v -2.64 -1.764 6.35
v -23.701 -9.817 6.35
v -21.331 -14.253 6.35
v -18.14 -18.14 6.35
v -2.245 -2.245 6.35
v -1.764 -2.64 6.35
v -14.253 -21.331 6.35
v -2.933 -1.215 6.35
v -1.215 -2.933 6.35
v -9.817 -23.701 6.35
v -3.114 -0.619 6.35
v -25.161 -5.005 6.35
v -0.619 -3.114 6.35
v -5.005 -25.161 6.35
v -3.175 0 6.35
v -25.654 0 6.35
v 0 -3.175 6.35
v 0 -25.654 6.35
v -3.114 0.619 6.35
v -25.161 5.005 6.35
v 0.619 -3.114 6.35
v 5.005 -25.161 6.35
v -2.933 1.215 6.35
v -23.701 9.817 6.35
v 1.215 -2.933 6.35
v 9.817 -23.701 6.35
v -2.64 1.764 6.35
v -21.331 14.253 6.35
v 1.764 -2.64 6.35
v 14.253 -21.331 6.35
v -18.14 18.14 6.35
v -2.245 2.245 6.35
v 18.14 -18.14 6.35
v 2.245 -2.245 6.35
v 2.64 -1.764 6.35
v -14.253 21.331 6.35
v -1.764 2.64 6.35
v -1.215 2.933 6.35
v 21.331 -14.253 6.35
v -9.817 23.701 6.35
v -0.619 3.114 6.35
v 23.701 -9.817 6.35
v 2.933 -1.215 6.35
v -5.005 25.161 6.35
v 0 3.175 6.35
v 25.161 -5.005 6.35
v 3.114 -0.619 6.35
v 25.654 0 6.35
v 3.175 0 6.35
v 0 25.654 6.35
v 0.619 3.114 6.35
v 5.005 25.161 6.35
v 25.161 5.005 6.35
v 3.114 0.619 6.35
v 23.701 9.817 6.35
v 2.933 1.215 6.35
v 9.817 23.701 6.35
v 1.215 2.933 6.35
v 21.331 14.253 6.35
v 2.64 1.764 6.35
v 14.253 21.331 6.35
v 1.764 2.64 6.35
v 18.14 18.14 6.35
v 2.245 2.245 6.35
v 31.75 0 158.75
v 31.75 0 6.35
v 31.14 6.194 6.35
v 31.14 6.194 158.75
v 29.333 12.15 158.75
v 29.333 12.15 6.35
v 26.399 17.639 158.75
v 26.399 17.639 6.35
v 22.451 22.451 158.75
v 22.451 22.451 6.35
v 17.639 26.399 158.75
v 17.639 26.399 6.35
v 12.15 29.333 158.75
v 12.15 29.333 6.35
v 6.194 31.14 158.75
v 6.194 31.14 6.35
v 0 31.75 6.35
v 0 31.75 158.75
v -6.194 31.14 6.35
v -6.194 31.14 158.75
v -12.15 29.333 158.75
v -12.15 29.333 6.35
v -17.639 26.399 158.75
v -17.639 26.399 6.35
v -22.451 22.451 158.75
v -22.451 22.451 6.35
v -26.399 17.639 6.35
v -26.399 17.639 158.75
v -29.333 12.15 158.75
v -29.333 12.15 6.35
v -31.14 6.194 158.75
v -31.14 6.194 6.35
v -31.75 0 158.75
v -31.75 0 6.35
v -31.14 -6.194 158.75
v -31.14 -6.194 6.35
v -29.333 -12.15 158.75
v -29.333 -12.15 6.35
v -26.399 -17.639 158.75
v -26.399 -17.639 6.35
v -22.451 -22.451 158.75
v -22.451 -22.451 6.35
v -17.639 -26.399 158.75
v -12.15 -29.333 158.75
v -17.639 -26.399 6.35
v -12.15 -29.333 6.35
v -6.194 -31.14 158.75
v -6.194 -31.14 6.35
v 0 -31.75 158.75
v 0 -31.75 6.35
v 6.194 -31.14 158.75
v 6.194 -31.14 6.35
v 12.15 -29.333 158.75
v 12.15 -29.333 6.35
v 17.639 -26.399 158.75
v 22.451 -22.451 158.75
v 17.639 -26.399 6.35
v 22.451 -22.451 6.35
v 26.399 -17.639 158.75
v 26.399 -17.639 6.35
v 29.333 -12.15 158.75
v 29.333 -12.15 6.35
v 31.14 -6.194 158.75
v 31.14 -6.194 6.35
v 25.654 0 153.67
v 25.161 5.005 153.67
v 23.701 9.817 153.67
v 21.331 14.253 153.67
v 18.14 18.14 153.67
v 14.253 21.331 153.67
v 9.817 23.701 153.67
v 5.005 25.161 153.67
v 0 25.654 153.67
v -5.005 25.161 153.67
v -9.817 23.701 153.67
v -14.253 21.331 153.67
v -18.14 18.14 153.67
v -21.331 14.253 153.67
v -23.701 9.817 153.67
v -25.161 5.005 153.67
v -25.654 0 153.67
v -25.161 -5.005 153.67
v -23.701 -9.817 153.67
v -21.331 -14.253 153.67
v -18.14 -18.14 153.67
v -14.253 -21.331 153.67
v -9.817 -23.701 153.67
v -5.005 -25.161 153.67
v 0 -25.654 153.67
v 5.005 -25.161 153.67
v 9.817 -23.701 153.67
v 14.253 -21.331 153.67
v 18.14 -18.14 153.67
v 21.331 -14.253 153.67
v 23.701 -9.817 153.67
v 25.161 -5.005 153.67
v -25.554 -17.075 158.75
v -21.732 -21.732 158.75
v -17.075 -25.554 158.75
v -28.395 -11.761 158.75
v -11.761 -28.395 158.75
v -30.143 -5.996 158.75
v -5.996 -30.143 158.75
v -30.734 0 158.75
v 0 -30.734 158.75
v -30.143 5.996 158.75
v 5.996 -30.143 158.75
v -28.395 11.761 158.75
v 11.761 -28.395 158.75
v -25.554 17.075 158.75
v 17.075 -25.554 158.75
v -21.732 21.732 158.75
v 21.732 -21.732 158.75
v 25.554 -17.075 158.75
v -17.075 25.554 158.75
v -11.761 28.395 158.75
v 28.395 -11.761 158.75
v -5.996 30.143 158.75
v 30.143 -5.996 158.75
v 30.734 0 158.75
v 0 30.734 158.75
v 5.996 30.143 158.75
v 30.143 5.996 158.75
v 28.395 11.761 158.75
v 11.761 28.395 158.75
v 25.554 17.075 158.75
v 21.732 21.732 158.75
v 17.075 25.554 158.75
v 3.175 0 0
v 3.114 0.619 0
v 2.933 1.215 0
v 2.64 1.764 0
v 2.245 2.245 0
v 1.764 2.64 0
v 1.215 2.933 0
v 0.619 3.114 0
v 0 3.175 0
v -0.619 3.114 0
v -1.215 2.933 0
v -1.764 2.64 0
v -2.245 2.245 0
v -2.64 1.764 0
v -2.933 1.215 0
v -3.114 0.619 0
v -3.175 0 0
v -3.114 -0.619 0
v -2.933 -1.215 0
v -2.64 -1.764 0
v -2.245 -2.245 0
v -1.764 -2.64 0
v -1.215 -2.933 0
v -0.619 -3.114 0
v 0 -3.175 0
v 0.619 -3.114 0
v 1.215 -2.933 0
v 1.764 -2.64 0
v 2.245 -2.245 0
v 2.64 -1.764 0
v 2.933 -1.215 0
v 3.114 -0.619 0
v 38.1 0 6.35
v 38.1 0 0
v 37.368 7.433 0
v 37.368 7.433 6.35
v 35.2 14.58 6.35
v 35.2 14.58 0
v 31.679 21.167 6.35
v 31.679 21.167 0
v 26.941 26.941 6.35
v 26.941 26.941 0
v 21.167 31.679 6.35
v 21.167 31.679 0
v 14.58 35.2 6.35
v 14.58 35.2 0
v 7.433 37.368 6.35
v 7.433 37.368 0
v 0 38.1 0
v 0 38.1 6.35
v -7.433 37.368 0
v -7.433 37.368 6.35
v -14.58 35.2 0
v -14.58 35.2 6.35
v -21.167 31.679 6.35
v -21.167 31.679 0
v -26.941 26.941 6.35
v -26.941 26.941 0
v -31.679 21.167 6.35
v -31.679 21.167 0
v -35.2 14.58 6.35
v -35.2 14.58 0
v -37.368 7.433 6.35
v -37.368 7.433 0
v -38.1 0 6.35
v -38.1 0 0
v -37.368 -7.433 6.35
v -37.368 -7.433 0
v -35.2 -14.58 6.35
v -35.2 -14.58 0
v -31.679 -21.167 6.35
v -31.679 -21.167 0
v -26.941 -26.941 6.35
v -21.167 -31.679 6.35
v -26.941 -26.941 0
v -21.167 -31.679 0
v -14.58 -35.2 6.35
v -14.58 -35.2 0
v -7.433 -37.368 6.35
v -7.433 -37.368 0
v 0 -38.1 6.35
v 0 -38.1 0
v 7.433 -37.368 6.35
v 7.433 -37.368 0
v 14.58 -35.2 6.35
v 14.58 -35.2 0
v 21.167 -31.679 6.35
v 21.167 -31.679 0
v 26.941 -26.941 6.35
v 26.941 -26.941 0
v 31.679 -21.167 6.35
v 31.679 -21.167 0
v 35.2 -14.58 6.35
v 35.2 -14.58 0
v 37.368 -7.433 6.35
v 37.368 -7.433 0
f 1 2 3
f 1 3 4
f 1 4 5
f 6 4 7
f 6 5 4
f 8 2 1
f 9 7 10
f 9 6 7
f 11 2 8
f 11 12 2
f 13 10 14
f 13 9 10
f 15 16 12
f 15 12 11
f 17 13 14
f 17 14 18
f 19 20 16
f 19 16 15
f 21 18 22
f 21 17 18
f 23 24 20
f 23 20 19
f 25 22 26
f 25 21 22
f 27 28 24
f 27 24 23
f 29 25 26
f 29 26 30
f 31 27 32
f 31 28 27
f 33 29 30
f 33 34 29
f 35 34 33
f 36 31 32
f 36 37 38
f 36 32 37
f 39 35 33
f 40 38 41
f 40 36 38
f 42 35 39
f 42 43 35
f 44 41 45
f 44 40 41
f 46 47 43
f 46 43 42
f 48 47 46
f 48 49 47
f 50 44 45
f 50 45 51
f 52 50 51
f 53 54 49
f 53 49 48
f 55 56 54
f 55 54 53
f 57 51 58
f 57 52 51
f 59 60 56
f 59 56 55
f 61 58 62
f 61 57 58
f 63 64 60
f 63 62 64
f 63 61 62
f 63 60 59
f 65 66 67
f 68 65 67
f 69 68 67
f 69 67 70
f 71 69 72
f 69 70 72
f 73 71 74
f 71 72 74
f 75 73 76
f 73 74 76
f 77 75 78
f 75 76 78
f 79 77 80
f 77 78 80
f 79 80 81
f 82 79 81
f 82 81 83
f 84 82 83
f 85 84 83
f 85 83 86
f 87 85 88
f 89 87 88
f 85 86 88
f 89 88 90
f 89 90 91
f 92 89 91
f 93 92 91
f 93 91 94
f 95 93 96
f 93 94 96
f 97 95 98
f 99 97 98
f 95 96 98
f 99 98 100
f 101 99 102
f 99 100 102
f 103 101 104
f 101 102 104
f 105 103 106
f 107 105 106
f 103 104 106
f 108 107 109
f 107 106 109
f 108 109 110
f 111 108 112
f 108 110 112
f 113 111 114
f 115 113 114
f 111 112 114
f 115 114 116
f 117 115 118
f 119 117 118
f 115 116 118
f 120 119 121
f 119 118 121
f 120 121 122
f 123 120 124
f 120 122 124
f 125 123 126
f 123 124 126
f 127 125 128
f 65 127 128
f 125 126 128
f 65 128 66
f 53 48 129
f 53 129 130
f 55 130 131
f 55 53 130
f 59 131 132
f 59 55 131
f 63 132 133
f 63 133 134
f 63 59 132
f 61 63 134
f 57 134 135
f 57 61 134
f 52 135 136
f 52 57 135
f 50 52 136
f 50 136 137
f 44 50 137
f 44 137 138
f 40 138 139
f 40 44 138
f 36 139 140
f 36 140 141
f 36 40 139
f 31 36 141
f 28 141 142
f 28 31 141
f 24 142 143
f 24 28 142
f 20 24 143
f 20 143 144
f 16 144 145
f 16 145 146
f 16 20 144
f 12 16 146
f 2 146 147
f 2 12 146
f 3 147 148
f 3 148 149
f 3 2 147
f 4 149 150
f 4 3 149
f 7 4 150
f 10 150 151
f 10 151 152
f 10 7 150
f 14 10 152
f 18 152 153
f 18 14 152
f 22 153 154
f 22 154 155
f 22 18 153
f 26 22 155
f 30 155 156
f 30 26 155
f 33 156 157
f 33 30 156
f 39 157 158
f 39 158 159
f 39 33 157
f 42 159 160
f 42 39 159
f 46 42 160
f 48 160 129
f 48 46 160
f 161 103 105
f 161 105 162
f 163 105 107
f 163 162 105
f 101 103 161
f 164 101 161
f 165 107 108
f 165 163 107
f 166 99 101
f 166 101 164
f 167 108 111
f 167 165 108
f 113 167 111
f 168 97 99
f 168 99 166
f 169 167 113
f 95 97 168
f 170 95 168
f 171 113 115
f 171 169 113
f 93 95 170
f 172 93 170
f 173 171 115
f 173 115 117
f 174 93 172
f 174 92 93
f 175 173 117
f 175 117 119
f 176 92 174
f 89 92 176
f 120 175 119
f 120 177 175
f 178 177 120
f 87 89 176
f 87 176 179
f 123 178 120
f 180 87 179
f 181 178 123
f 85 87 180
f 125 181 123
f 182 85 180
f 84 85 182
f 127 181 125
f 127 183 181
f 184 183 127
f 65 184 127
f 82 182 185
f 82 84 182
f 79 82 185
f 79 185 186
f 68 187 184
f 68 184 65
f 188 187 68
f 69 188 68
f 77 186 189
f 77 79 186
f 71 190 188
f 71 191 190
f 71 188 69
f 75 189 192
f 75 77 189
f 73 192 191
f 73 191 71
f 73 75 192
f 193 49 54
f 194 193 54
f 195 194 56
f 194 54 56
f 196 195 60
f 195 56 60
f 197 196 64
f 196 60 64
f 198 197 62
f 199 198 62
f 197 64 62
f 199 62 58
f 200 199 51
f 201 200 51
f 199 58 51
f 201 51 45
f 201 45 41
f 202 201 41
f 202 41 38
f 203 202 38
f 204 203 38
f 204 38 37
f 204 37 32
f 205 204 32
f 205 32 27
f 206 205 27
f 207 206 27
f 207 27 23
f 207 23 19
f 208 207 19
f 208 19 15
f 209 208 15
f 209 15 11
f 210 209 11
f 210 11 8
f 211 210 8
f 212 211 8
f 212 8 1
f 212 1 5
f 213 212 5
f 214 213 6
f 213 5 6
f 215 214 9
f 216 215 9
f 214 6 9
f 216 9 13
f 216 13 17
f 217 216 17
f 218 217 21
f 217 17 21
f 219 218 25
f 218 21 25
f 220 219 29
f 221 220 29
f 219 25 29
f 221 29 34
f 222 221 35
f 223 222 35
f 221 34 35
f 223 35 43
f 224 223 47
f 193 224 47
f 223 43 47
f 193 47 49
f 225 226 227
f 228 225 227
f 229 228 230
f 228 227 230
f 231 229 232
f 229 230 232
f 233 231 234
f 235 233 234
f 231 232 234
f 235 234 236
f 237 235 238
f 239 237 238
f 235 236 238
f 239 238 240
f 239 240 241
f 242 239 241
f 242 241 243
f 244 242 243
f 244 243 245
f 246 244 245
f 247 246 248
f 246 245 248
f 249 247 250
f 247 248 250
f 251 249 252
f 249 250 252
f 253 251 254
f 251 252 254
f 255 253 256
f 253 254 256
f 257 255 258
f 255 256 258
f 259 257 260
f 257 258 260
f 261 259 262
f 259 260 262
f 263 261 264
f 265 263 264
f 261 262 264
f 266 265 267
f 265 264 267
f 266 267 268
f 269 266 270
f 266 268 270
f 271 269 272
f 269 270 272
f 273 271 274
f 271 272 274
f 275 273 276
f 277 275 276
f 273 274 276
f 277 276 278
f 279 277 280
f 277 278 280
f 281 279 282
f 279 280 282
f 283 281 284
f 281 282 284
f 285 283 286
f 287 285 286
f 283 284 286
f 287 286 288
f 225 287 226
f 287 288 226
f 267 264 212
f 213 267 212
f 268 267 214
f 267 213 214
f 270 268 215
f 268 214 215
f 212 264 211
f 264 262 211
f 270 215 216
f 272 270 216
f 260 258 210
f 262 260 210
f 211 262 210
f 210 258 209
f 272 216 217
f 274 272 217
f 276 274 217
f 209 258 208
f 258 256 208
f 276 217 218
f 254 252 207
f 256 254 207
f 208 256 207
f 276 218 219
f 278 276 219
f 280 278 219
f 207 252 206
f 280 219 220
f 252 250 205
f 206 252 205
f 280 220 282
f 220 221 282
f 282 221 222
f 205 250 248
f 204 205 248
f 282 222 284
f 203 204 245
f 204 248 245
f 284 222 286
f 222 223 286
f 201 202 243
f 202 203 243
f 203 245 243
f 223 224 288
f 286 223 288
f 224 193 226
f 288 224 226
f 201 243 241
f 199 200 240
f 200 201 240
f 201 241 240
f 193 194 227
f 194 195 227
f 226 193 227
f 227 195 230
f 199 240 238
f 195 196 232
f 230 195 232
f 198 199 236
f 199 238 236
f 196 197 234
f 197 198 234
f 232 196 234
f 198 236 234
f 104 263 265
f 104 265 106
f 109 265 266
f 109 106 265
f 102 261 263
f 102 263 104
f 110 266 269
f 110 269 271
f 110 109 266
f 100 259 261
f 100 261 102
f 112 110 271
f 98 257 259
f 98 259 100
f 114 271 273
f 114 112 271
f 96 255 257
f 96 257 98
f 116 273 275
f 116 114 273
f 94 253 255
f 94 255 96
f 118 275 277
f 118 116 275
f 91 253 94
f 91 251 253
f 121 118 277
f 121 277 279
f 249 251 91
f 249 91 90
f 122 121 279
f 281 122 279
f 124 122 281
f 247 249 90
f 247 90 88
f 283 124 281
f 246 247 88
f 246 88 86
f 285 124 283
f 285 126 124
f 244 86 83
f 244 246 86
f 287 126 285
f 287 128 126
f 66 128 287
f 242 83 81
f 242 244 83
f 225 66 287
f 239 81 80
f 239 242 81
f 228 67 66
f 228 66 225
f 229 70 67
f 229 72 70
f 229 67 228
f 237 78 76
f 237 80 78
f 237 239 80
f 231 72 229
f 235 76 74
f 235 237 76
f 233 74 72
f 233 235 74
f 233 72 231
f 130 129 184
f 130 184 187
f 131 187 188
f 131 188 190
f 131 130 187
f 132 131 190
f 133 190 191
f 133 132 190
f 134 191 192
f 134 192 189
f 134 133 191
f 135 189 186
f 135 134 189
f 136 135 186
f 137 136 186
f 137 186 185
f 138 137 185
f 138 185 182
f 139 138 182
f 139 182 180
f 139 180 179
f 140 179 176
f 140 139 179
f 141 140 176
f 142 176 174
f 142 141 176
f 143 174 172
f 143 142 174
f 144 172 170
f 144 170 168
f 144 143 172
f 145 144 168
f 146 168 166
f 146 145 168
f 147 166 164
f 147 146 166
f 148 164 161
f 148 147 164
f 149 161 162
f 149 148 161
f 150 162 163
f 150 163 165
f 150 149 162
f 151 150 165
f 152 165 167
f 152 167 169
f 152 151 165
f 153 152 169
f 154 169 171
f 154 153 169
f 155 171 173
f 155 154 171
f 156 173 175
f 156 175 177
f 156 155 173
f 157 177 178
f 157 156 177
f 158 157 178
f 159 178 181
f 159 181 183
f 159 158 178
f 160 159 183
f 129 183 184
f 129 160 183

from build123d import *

# Parameters (mm, degrees)
F0_R     = 38.1
F1_DEPTH = 6.35
F2_R     = 31.75
F2_R_2   = 25.654
F3_DEPTH = 152.4
F4_R     = 3.175
F5_DEPTH = 25.4
F6_SIZE  = 5.08


with BuildPart() as f1:
    # F0 (on Top) → F1 (new body)
    with BuildSketch(Plane.XY):
        Circle(F0_R)
    extrude(amount=F1_DEPTH)

    # F2 (on face) → F3 (join)
    with BuildSketch(Plane.XY.offset(6.35)):
        Circle(F2_R)
        Circle(F2_R_2, mode=Mode.SUBTRACT)
    extrude(amount=F3_DEPTH)

    # F4 (on face) → F5 (cut)
    with BuildSketch(Plane.XY.offset(6.35)):
        Circle(F4_R)
    extrude(amount=-F5_DEPTH, mode=Mode.SUBTRACT)

    # F6
    f6_edges = [f1.edges().sort_by_distance(p)[0] for p in [
        (-25.654, 0, 158.75),
    ]]
    chamfer(f6_edges, length=F6_SIZE)


solid = f1.part
